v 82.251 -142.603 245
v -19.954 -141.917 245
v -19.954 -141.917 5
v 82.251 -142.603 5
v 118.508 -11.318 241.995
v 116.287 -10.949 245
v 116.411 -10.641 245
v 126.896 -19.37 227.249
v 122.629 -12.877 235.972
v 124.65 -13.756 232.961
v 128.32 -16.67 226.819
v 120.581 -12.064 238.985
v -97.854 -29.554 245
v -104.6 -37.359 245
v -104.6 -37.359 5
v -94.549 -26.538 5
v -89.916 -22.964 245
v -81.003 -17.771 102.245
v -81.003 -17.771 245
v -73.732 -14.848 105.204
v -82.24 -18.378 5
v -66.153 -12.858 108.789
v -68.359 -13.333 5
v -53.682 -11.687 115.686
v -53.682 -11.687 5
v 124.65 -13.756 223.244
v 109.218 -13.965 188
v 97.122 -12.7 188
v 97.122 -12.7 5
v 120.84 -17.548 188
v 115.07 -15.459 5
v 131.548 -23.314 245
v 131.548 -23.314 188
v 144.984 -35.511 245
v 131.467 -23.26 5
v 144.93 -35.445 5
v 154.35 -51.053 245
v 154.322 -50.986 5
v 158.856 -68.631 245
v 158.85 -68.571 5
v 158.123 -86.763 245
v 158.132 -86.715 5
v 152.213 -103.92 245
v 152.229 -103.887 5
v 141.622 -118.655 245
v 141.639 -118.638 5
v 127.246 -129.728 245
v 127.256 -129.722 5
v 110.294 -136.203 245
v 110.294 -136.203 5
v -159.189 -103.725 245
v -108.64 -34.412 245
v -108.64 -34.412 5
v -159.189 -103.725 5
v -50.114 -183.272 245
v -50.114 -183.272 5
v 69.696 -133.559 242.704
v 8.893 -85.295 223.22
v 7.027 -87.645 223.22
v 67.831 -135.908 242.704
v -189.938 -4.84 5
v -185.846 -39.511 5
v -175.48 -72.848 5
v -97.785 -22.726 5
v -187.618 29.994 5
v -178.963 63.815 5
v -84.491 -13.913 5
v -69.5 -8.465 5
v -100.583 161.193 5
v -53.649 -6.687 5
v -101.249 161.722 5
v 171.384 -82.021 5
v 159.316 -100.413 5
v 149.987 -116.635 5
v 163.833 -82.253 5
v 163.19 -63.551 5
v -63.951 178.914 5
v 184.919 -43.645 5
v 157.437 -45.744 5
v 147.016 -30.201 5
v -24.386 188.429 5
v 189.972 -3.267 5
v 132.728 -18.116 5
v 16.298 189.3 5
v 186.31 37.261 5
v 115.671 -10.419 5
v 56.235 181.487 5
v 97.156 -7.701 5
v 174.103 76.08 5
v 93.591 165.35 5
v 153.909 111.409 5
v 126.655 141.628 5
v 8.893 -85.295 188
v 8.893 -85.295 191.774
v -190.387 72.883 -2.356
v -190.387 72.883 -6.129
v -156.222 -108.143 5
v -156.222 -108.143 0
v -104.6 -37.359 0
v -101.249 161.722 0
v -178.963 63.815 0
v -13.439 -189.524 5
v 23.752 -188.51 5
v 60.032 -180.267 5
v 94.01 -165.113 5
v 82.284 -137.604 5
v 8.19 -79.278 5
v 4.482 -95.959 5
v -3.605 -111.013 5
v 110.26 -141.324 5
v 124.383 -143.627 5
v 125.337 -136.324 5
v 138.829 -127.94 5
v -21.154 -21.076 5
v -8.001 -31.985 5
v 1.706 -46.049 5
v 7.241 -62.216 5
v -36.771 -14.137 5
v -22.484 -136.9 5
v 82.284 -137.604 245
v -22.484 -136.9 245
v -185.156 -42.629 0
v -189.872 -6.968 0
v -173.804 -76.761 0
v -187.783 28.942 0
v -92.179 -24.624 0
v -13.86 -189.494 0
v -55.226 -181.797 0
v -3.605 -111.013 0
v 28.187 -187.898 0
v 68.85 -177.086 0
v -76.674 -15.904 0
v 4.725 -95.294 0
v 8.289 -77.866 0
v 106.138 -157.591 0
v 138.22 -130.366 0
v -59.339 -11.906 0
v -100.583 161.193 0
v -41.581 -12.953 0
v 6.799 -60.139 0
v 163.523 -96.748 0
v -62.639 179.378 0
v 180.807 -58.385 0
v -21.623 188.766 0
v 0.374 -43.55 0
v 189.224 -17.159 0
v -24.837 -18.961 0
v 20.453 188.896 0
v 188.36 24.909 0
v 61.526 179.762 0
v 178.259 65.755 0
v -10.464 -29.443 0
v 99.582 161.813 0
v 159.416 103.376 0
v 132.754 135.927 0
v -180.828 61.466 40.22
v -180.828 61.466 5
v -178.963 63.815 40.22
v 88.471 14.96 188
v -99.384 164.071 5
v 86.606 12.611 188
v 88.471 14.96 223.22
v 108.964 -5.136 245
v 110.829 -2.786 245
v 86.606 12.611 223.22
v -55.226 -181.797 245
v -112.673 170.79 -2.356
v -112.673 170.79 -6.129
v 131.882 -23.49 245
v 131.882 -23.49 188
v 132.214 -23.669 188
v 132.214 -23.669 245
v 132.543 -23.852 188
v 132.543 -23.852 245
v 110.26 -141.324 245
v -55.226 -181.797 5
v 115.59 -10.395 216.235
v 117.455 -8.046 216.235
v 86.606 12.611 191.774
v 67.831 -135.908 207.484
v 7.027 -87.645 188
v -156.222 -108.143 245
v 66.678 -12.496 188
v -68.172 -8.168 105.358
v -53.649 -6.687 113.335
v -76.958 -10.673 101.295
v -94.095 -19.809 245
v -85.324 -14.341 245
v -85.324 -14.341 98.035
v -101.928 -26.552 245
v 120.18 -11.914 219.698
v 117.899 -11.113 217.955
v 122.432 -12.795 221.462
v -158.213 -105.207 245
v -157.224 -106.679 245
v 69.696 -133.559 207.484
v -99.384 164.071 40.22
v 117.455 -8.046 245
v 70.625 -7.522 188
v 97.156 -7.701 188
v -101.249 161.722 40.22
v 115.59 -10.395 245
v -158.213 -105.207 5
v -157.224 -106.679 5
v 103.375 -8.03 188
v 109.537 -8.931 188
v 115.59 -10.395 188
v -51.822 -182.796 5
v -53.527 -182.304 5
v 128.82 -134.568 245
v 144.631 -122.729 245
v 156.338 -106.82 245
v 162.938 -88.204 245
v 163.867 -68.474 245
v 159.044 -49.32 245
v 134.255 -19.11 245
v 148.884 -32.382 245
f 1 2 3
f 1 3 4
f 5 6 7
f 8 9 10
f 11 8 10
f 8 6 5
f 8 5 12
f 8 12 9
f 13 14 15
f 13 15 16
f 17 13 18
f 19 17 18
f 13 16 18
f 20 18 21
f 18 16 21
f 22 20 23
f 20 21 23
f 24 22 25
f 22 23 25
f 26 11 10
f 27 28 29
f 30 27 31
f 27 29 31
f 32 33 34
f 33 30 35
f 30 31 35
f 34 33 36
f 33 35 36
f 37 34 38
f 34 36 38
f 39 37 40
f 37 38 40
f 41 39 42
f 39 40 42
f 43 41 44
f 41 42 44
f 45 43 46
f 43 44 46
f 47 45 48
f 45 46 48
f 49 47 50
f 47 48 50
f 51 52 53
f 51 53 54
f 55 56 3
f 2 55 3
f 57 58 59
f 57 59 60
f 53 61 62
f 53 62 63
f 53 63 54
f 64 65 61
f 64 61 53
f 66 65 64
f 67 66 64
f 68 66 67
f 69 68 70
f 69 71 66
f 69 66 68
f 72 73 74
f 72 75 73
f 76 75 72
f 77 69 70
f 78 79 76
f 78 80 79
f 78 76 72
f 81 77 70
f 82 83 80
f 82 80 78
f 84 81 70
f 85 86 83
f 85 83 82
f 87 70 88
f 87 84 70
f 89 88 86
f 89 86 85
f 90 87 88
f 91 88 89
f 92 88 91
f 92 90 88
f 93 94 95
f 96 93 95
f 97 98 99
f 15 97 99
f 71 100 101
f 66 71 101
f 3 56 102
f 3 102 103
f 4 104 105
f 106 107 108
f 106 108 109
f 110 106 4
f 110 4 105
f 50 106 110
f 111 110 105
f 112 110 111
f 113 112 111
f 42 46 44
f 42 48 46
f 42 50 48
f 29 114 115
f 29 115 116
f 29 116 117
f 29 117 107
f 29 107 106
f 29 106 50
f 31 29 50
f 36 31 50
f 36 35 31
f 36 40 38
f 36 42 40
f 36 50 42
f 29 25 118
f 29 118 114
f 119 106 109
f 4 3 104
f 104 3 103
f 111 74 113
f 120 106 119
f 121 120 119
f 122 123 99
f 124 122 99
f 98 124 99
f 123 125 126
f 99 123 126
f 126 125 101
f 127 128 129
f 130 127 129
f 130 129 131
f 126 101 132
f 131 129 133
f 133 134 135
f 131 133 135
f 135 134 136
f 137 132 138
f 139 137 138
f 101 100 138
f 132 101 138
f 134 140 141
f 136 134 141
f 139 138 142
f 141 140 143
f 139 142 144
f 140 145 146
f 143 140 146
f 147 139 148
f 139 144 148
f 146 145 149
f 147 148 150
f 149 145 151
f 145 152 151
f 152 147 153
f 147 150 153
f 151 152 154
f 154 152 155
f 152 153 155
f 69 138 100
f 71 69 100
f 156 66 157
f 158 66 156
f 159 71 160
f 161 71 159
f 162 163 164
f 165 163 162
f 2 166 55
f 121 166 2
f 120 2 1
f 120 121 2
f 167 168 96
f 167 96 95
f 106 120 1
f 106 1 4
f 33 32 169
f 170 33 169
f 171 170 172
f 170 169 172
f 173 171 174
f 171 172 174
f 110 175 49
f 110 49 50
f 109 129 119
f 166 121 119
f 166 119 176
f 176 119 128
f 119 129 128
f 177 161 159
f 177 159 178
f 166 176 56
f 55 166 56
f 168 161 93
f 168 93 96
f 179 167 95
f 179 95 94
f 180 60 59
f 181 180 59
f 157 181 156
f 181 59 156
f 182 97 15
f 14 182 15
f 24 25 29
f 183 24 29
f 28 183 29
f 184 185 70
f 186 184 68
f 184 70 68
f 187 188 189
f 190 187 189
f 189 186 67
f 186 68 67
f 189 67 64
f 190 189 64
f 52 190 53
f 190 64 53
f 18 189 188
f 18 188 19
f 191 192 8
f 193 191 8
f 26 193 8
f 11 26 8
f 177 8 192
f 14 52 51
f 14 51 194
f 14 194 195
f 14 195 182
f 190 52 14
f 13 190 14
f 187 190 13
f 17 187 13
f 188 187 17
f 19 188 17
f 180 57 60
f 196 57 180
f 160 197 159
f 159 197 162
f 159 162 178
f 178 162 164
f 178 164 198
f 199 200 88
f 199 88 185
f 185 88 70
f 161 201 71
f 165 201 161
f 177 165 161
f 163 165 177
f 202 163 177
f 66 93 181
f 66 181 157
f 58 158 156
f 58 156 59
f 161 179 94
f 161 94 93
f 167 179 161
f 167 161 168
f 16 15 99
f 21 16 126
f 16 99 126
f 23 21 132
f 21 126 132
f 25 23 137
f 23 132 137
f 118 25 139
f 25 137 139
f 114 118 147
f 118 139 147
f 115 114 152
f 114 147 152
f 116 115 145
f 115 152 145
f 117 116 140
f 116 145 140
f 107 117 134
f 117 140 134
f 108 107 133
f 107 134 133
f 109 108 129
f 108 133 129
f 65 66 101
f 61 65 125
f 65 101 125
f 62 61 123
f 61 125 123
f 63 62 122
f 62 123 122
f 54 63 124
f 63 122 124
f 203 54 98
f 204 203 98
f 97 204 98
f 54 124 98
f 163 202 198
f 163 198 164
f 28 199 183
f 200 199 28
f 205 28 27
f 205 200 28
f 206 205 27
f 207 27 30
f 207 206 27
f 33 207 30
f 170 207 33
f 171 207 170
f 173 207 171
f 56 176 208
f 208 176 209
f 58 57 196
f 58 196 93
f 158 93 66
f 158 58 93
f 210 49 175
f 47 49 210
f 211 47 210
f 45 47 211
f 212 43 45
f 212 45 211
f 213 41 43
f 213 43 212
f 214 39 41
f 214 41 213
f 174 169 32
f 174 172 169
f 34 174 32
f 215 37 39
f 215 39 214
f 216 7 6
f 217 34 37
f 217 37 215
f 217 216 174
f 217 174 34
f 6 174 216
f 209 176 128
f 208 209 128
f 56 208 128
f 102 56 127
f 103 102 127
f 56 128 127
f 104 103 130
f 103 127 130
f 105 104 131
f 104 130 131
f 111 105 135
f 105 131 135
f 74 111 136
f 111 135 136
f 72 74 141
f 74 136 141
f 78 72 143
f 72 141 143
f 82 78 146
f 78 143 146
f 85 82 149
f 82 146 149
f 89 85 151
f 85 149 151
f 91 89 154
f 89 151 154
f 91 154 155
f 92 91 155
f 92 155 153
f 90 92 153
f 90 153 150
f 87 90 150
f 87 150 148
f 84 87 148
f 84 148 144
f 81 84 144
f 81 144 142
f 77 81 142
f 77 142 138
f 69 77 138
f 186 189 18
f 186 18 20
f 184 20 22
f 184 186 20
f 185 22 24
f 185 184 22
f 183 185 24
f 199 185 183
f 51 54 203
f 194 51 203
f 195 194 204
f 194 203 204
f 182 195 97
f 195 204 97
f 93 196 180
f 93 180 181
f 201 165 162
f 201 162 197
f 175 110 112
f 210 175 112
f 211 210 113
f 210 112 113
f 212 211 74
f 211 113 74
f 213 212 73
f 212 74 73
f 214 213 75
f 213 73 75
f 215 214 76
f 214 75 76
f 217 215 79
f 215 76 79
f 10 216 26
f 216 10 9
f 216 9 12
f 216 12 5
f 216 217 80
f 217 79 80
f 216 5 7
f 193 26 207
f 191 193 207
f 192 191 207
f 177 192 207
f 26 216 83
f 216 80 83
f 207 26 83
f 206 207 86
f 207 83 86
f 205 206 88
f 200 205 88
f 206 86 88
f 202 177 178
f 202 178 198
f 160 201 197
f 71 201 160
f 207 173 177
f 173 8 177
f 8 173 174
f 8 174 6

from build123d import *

# Parameters (mm, degrees)
BOSS_EXTRUDE1_DEPTH     = 5
BOSS_EXTRUDE2_DEPTH     = 240
CUT_EXTRUDE1_DEPTH      = 57
SKETCH5_W               = 28
SKETCH5_H               = 240
CUT_EXTRUDE2_DEPTH      = 2
CUT_EXTRUDE2_DEPTH_BACK = 10
BOSS_EXTRUDE3_DEPTH     = 3
BOSS_EXTRUDE8_DEPTH     = 125
BOSS_EXTRUDE9_DEPTH     = 3
CUT_EXTRUDE3_DEPTH      = 150


with BuildPart() as part:
    # Sketch1 → Boss-Extrude1 (new body)
    with BuildSketch(Plane.XY):
        with BuildLine():
            Line((-156.221589014, -108.14256852), (-104.600080398, -37.358665564))
            ThreePointArc((-104.600080398, -37.358665564), (-17.275313464, -23.688091466), (-3.604733957, -111.012857552))
            Line((-3.604733957, -111.012857552), (-55.226242573, -181.796760508))
            ThreePointArc((-55.226242573, -181.796760508), (188.36019605, 24.908563671), (-100.582828609, 161.192724988))
            Line((-100.582828609, 161.192724988), (-101.249092052, 161.721574551))
            Line((-101.249092052, 161.721574551), (-178.962550118, 63.815402961))
            ThreePointArc((-178.962550118, 63.815402961), (-188.359995143, -24.91008289), (-156.221589014, -108.14256852))
        make_face()
    extrude(amount=BOSS_EXTRUDE1_DEPTH)

    # Sketch2 → Boss-Extrude2 (add)
    with BuildSketch(Plane.XY.offset(5)):
        with BuildLine():
            Line((-53.682461639, -11.687175551), (97.122325749, -12.700480692))
            ThreePointArc((97.122325749, -12.700480692), (159.200967064, -75.619017647), (96.28243011, -137.697658962))
            Line((96.28243011, -137.697658962), (-22.483523352, -136.899632896))
            Line((-22.483523352, -136.899632896), (-55.226242573, -181.796760508))
            Line((-55.226242573, -181.796760508), (-50.113689849, -183.271978463))
            Line((-50.113689849, -183.271978463), (-19.954012463, -141.916742352))
            Line((-19.954012463, -141.916742352), (96.248834284, -142.697546092))
            ThreePointArc((96.248834284, -142.697546092), (164.200854195, -75.652613472), (97.155921575, -7.700593561))
            Line((97.155921575, -7.700593561), (-53.648865813, -6.68728842))
            ThreePointArc((-53.648865813, -6.68728842), (-84.490563822, -13.912967552), (-108.639893019, -34.412496189))
            Line((-108.639893019, -34.412496189), (-159.188664076, -103.725451215))
            ThreePointArc((-159.188664076, -103.725451215), (-157.720590507, -105.944397352), (-156.221589014, -108.14256852))
            Line((-156.221589014, -108.14256852), (-104.600079422, -37.358664226))
            ThreePointArc((-104.600079422, -37.358664226), (-82.239589425, -18.377619191), (-53.682461639, -11.687175551))
        make_face()
    extrude(amount=BOSS_EXTRUDE2_DEPTH)

    # Sketch3 → Cut-Extrude1 (cut)
    with BuildSketch(Plane.XY.offset(245)):
        with BuildLine():
            Line((-22.32861185, -18.477374243), (115.778336244, -19.405358579))
            ThreePointArc((115.778336244, -19.405358579), (124.443199044, -20.564624968), (132.543492936, -23.852327019))
            Line((132.543492936, -23.852327019), (115.590087785, -10.395486466))
            ThreePointArc((115.590087785, -10.395486466), (106.466425947, -8.409000458), (97.155921575, -7.700593561))
            Line((97.155921575, -7.700593561), (-53.648865813, -6.68728842))
            ThreePointArc((-53.648865813, -6.68728842), (-68.336249989, -8.203586912), (-82.342539109, -12.877159439))
            Line((-82.342539109, -12.877159439), (-77.164256517, -16.987444219))
            Line((-77.164256517, -16.987444219), (-22.32861185, -18.477374243))
        make_face()
    extrude(amount=-CUT_EXTRUDE1_DEPTH, mode=Mode.SUBTRACT)

    # Sketch5 → Cut-Extrude2 (cut, two sides)
    with BuildSketch(Plane(origin=(-0.920845541, -137.044519359, 0), x_dir=(0.999977426, -0.006719165, 0), z_dir=(0.006719165, 0.999977426, 0))) as cut_extrude2_sk:
        with Locations((97.206835425, -125)):
            Rectangle(SKETCH5_W, SKETCH5_H)
    extrude(amount=CUT_EXTRUDE2_DEPTH, mode=Mode.SUBTRACT)
    extrude(cut_extrude2_sk.sketch, amount=-CUT_EXTRUDE2_DEPTH_BACK, mode=Mode.SUBTRACT)

    # Sketch12 → Cut-Extrude3 (cut)
    with BuildSketch(Plane(origin=(-53.721281932, 42.641505871, 89.891408816), x_dir=(-0.879922716, -0.20363034, -0.42926763), z_dir=(0.475116842, -0.377126101, -0.795009365))):
        Polygon((-206.883720933, -112.273873862), (64.877277089, 159.058147248), (157.435069425, 66.354020706), (-136.195988802, -226.813538544), align=None)
    extrude(amount=-CUT_EXTRUDE3_DEPTH, mode=Mode.SUBTRACT)


with BuildPart() as body_2:
    # Sketch8 → Boss-Extrude3 (new body)
    with BuildSketch(Plane(origin=(39.615824932, 49.909421739, 0), x_dir=(0.783249373, -0.621707665, 0), z_dir=(-0.621707665, -0.783249373, 0))):
        Polygon((-179.846830256, 5), (59.99391493, 188), (96.998817362, 216.234973752), (96.998817362, 245), (88.539274328, 245), (59.99391493, 223.219710893), (-179.846830256, 40.219710893), align=None)
    extrude(amount=-BOSS_EXTRUDE3_DEPTH)


with BuildPart() as body_3:
    # Sketch9 → Boss-Extrude8 (new body)
    with BuildSketch(Plane(origin=(39.615824932, 49.909421739, 0), x_dir=(-0.783249373, 0.621707665, 0), z_dir=(0.621707665, 0.783249373, 0))):
        Polygon((-59.99391493, 191.773540453), (-59.99391493, 188), (194.432609905, -6.129041788), (194.432609905, -2.355501335), align=None)
    extrude(amount=-BOSS_EXTRUDE8_DEPTH)


with BuildPart() as body_4:
    # Sketch11 → Boss-Extrude9 (new body)
    with BuildSketch(Plane(origin=(-38.097633135, -47.996749851, 0), x_dir=(0.783249373, -0.621707665, 0), z_dir=(-0.621707665, -0.783249373, 0))):
        Polygon((-179.846830256, 5), (-179.846830256, 40.219710893), (59.99391493, 223.219710893), (137.623861395, 242.703985504), (137.623861395, 207.484274612), (59.99391493, 188), align=None)
    extrude(amount=BOSS_EXTRUDE9_DEPTH)


solid = Compound([part.part, body_2.part, body_3.part, body_4.part])
